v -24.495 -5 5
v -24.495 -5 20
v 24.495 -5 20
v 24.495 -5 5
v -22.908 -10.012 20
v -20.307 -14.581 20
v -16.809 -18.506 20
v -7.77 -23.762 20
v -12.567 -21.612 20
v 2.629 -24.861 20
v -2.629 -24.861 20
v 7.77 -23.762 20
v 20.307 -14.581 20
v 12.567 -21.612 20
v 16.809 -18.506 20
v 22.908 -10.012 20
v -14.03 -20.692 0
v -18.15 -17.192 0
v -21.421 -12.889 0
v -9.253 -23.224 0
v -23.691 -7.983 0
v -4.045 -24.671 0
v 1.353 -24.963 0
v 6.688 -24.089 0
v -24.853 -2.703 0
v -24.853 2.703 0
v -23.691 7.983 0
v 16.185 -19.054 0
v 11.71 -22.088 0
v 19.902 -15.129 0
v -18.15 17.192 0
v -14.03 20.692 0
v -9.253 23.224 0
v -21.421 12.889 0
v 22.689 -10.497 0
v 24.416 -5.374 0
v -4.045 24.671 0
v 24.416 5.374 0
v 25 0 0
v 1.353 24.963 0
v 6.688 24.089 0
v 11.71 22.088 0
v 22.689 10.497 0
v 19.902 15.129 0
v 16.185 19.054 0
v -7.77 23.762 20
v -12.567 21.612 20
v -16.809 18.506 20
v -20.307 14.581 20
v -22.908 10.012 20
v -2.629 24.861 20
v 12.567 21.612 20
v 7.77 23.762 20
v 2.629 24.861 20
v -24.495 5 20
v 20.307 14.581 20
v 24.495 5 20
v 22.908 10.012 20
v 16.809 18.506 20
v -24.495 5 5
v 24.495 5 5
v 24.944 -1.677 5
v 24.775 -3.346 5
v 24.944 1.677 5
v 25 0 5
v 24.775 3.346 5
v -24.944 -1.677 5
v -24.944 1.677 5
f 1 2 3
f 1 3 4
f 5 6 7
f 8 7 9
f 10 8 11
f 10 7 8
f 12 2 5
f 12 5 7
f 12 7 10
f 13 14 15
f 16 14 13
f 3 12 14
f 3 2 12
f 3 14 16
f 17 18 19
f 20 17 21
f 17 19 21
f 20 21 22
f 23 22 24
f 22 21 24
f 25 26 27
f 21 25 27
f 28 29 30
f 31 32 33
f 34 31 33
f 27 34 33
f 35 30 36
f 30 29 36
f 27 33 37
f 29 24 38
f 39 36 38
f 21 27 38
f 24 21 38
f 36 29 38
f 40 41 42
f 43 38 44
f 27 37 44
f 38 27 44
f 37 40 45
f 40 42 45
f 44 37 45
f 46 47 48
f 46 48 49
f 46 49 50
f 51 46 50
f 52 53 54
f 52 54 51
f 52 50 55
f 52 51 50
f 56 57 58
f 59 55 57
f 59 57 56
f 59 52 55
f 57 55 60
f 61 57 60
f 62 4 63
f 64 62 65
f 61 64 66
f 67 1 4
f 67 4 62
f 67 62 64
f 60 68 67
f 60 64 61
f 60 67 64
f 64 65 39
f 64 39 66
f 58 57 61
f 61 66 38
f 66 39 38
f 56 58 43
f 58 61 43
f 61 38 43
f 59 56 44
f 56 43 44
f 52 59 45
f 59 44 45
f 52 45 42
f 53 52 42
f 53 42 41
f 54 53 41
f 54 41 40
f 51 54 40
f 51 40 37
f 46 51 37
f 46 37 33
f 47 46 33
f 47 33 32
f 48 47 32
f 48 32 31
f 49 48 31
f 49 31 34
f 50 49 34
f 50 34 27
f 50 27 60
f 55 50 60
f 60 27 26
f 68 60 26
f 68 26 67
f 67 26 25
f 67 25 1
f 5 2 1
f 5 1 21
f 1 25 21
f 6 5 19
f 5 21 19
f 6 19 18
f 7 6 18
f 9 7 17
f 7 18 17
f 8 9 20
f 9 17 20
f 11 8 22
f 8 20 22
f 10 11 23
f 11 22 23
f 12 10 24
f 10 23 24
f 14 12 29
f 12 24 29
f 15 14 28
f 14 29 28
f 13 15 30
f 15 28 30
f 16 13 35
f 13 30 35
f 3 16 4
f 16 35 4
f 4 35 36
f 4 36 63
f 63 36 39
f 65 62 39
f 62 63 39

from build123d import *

# Parameters (mm, degrees)
SKETCH1_R               = 25
BOSS_EXTRUDE1_DEPTH     = 20
CUT_EXTRUDE1_DEPTH      = 41.620192023
CUT_EXTRUDE1_DEPTH_BACK = 41.620192023
SKETCH2_W               = 30
SKETCH2_H               = 10


with BuildPart() as part:
    # Sketch1 → Boss-Extrude1 (new body)
    with BuildSketch(Plane.XY):
        Circle(SKETCH1_R)
    extrude(amount=BOSS_EXTRUDE1_DEPTH)

    # Sketch2 → Cut-Extrude1 (cut, two sides: drawn at the far end of the back side and taken through both)
    with BuildSketch(Plane(origin=(0, 0, 0), x_dir=(0, 0, -1), z_dir=(1, 0, 0)).offset(-CUT_EXTRUDE1_DEPTH_BACK)):
        with Locations((-20, 0)):
            Rectangle(SKETCH2_W, SKETCH2_H)
    extrude(amount=CUT_EXTRUDE1_DEPTH + CUT_EXTRUDE1_DEPTH_BACK, mode=Mode.SUBTRACT)


solid = part.part
